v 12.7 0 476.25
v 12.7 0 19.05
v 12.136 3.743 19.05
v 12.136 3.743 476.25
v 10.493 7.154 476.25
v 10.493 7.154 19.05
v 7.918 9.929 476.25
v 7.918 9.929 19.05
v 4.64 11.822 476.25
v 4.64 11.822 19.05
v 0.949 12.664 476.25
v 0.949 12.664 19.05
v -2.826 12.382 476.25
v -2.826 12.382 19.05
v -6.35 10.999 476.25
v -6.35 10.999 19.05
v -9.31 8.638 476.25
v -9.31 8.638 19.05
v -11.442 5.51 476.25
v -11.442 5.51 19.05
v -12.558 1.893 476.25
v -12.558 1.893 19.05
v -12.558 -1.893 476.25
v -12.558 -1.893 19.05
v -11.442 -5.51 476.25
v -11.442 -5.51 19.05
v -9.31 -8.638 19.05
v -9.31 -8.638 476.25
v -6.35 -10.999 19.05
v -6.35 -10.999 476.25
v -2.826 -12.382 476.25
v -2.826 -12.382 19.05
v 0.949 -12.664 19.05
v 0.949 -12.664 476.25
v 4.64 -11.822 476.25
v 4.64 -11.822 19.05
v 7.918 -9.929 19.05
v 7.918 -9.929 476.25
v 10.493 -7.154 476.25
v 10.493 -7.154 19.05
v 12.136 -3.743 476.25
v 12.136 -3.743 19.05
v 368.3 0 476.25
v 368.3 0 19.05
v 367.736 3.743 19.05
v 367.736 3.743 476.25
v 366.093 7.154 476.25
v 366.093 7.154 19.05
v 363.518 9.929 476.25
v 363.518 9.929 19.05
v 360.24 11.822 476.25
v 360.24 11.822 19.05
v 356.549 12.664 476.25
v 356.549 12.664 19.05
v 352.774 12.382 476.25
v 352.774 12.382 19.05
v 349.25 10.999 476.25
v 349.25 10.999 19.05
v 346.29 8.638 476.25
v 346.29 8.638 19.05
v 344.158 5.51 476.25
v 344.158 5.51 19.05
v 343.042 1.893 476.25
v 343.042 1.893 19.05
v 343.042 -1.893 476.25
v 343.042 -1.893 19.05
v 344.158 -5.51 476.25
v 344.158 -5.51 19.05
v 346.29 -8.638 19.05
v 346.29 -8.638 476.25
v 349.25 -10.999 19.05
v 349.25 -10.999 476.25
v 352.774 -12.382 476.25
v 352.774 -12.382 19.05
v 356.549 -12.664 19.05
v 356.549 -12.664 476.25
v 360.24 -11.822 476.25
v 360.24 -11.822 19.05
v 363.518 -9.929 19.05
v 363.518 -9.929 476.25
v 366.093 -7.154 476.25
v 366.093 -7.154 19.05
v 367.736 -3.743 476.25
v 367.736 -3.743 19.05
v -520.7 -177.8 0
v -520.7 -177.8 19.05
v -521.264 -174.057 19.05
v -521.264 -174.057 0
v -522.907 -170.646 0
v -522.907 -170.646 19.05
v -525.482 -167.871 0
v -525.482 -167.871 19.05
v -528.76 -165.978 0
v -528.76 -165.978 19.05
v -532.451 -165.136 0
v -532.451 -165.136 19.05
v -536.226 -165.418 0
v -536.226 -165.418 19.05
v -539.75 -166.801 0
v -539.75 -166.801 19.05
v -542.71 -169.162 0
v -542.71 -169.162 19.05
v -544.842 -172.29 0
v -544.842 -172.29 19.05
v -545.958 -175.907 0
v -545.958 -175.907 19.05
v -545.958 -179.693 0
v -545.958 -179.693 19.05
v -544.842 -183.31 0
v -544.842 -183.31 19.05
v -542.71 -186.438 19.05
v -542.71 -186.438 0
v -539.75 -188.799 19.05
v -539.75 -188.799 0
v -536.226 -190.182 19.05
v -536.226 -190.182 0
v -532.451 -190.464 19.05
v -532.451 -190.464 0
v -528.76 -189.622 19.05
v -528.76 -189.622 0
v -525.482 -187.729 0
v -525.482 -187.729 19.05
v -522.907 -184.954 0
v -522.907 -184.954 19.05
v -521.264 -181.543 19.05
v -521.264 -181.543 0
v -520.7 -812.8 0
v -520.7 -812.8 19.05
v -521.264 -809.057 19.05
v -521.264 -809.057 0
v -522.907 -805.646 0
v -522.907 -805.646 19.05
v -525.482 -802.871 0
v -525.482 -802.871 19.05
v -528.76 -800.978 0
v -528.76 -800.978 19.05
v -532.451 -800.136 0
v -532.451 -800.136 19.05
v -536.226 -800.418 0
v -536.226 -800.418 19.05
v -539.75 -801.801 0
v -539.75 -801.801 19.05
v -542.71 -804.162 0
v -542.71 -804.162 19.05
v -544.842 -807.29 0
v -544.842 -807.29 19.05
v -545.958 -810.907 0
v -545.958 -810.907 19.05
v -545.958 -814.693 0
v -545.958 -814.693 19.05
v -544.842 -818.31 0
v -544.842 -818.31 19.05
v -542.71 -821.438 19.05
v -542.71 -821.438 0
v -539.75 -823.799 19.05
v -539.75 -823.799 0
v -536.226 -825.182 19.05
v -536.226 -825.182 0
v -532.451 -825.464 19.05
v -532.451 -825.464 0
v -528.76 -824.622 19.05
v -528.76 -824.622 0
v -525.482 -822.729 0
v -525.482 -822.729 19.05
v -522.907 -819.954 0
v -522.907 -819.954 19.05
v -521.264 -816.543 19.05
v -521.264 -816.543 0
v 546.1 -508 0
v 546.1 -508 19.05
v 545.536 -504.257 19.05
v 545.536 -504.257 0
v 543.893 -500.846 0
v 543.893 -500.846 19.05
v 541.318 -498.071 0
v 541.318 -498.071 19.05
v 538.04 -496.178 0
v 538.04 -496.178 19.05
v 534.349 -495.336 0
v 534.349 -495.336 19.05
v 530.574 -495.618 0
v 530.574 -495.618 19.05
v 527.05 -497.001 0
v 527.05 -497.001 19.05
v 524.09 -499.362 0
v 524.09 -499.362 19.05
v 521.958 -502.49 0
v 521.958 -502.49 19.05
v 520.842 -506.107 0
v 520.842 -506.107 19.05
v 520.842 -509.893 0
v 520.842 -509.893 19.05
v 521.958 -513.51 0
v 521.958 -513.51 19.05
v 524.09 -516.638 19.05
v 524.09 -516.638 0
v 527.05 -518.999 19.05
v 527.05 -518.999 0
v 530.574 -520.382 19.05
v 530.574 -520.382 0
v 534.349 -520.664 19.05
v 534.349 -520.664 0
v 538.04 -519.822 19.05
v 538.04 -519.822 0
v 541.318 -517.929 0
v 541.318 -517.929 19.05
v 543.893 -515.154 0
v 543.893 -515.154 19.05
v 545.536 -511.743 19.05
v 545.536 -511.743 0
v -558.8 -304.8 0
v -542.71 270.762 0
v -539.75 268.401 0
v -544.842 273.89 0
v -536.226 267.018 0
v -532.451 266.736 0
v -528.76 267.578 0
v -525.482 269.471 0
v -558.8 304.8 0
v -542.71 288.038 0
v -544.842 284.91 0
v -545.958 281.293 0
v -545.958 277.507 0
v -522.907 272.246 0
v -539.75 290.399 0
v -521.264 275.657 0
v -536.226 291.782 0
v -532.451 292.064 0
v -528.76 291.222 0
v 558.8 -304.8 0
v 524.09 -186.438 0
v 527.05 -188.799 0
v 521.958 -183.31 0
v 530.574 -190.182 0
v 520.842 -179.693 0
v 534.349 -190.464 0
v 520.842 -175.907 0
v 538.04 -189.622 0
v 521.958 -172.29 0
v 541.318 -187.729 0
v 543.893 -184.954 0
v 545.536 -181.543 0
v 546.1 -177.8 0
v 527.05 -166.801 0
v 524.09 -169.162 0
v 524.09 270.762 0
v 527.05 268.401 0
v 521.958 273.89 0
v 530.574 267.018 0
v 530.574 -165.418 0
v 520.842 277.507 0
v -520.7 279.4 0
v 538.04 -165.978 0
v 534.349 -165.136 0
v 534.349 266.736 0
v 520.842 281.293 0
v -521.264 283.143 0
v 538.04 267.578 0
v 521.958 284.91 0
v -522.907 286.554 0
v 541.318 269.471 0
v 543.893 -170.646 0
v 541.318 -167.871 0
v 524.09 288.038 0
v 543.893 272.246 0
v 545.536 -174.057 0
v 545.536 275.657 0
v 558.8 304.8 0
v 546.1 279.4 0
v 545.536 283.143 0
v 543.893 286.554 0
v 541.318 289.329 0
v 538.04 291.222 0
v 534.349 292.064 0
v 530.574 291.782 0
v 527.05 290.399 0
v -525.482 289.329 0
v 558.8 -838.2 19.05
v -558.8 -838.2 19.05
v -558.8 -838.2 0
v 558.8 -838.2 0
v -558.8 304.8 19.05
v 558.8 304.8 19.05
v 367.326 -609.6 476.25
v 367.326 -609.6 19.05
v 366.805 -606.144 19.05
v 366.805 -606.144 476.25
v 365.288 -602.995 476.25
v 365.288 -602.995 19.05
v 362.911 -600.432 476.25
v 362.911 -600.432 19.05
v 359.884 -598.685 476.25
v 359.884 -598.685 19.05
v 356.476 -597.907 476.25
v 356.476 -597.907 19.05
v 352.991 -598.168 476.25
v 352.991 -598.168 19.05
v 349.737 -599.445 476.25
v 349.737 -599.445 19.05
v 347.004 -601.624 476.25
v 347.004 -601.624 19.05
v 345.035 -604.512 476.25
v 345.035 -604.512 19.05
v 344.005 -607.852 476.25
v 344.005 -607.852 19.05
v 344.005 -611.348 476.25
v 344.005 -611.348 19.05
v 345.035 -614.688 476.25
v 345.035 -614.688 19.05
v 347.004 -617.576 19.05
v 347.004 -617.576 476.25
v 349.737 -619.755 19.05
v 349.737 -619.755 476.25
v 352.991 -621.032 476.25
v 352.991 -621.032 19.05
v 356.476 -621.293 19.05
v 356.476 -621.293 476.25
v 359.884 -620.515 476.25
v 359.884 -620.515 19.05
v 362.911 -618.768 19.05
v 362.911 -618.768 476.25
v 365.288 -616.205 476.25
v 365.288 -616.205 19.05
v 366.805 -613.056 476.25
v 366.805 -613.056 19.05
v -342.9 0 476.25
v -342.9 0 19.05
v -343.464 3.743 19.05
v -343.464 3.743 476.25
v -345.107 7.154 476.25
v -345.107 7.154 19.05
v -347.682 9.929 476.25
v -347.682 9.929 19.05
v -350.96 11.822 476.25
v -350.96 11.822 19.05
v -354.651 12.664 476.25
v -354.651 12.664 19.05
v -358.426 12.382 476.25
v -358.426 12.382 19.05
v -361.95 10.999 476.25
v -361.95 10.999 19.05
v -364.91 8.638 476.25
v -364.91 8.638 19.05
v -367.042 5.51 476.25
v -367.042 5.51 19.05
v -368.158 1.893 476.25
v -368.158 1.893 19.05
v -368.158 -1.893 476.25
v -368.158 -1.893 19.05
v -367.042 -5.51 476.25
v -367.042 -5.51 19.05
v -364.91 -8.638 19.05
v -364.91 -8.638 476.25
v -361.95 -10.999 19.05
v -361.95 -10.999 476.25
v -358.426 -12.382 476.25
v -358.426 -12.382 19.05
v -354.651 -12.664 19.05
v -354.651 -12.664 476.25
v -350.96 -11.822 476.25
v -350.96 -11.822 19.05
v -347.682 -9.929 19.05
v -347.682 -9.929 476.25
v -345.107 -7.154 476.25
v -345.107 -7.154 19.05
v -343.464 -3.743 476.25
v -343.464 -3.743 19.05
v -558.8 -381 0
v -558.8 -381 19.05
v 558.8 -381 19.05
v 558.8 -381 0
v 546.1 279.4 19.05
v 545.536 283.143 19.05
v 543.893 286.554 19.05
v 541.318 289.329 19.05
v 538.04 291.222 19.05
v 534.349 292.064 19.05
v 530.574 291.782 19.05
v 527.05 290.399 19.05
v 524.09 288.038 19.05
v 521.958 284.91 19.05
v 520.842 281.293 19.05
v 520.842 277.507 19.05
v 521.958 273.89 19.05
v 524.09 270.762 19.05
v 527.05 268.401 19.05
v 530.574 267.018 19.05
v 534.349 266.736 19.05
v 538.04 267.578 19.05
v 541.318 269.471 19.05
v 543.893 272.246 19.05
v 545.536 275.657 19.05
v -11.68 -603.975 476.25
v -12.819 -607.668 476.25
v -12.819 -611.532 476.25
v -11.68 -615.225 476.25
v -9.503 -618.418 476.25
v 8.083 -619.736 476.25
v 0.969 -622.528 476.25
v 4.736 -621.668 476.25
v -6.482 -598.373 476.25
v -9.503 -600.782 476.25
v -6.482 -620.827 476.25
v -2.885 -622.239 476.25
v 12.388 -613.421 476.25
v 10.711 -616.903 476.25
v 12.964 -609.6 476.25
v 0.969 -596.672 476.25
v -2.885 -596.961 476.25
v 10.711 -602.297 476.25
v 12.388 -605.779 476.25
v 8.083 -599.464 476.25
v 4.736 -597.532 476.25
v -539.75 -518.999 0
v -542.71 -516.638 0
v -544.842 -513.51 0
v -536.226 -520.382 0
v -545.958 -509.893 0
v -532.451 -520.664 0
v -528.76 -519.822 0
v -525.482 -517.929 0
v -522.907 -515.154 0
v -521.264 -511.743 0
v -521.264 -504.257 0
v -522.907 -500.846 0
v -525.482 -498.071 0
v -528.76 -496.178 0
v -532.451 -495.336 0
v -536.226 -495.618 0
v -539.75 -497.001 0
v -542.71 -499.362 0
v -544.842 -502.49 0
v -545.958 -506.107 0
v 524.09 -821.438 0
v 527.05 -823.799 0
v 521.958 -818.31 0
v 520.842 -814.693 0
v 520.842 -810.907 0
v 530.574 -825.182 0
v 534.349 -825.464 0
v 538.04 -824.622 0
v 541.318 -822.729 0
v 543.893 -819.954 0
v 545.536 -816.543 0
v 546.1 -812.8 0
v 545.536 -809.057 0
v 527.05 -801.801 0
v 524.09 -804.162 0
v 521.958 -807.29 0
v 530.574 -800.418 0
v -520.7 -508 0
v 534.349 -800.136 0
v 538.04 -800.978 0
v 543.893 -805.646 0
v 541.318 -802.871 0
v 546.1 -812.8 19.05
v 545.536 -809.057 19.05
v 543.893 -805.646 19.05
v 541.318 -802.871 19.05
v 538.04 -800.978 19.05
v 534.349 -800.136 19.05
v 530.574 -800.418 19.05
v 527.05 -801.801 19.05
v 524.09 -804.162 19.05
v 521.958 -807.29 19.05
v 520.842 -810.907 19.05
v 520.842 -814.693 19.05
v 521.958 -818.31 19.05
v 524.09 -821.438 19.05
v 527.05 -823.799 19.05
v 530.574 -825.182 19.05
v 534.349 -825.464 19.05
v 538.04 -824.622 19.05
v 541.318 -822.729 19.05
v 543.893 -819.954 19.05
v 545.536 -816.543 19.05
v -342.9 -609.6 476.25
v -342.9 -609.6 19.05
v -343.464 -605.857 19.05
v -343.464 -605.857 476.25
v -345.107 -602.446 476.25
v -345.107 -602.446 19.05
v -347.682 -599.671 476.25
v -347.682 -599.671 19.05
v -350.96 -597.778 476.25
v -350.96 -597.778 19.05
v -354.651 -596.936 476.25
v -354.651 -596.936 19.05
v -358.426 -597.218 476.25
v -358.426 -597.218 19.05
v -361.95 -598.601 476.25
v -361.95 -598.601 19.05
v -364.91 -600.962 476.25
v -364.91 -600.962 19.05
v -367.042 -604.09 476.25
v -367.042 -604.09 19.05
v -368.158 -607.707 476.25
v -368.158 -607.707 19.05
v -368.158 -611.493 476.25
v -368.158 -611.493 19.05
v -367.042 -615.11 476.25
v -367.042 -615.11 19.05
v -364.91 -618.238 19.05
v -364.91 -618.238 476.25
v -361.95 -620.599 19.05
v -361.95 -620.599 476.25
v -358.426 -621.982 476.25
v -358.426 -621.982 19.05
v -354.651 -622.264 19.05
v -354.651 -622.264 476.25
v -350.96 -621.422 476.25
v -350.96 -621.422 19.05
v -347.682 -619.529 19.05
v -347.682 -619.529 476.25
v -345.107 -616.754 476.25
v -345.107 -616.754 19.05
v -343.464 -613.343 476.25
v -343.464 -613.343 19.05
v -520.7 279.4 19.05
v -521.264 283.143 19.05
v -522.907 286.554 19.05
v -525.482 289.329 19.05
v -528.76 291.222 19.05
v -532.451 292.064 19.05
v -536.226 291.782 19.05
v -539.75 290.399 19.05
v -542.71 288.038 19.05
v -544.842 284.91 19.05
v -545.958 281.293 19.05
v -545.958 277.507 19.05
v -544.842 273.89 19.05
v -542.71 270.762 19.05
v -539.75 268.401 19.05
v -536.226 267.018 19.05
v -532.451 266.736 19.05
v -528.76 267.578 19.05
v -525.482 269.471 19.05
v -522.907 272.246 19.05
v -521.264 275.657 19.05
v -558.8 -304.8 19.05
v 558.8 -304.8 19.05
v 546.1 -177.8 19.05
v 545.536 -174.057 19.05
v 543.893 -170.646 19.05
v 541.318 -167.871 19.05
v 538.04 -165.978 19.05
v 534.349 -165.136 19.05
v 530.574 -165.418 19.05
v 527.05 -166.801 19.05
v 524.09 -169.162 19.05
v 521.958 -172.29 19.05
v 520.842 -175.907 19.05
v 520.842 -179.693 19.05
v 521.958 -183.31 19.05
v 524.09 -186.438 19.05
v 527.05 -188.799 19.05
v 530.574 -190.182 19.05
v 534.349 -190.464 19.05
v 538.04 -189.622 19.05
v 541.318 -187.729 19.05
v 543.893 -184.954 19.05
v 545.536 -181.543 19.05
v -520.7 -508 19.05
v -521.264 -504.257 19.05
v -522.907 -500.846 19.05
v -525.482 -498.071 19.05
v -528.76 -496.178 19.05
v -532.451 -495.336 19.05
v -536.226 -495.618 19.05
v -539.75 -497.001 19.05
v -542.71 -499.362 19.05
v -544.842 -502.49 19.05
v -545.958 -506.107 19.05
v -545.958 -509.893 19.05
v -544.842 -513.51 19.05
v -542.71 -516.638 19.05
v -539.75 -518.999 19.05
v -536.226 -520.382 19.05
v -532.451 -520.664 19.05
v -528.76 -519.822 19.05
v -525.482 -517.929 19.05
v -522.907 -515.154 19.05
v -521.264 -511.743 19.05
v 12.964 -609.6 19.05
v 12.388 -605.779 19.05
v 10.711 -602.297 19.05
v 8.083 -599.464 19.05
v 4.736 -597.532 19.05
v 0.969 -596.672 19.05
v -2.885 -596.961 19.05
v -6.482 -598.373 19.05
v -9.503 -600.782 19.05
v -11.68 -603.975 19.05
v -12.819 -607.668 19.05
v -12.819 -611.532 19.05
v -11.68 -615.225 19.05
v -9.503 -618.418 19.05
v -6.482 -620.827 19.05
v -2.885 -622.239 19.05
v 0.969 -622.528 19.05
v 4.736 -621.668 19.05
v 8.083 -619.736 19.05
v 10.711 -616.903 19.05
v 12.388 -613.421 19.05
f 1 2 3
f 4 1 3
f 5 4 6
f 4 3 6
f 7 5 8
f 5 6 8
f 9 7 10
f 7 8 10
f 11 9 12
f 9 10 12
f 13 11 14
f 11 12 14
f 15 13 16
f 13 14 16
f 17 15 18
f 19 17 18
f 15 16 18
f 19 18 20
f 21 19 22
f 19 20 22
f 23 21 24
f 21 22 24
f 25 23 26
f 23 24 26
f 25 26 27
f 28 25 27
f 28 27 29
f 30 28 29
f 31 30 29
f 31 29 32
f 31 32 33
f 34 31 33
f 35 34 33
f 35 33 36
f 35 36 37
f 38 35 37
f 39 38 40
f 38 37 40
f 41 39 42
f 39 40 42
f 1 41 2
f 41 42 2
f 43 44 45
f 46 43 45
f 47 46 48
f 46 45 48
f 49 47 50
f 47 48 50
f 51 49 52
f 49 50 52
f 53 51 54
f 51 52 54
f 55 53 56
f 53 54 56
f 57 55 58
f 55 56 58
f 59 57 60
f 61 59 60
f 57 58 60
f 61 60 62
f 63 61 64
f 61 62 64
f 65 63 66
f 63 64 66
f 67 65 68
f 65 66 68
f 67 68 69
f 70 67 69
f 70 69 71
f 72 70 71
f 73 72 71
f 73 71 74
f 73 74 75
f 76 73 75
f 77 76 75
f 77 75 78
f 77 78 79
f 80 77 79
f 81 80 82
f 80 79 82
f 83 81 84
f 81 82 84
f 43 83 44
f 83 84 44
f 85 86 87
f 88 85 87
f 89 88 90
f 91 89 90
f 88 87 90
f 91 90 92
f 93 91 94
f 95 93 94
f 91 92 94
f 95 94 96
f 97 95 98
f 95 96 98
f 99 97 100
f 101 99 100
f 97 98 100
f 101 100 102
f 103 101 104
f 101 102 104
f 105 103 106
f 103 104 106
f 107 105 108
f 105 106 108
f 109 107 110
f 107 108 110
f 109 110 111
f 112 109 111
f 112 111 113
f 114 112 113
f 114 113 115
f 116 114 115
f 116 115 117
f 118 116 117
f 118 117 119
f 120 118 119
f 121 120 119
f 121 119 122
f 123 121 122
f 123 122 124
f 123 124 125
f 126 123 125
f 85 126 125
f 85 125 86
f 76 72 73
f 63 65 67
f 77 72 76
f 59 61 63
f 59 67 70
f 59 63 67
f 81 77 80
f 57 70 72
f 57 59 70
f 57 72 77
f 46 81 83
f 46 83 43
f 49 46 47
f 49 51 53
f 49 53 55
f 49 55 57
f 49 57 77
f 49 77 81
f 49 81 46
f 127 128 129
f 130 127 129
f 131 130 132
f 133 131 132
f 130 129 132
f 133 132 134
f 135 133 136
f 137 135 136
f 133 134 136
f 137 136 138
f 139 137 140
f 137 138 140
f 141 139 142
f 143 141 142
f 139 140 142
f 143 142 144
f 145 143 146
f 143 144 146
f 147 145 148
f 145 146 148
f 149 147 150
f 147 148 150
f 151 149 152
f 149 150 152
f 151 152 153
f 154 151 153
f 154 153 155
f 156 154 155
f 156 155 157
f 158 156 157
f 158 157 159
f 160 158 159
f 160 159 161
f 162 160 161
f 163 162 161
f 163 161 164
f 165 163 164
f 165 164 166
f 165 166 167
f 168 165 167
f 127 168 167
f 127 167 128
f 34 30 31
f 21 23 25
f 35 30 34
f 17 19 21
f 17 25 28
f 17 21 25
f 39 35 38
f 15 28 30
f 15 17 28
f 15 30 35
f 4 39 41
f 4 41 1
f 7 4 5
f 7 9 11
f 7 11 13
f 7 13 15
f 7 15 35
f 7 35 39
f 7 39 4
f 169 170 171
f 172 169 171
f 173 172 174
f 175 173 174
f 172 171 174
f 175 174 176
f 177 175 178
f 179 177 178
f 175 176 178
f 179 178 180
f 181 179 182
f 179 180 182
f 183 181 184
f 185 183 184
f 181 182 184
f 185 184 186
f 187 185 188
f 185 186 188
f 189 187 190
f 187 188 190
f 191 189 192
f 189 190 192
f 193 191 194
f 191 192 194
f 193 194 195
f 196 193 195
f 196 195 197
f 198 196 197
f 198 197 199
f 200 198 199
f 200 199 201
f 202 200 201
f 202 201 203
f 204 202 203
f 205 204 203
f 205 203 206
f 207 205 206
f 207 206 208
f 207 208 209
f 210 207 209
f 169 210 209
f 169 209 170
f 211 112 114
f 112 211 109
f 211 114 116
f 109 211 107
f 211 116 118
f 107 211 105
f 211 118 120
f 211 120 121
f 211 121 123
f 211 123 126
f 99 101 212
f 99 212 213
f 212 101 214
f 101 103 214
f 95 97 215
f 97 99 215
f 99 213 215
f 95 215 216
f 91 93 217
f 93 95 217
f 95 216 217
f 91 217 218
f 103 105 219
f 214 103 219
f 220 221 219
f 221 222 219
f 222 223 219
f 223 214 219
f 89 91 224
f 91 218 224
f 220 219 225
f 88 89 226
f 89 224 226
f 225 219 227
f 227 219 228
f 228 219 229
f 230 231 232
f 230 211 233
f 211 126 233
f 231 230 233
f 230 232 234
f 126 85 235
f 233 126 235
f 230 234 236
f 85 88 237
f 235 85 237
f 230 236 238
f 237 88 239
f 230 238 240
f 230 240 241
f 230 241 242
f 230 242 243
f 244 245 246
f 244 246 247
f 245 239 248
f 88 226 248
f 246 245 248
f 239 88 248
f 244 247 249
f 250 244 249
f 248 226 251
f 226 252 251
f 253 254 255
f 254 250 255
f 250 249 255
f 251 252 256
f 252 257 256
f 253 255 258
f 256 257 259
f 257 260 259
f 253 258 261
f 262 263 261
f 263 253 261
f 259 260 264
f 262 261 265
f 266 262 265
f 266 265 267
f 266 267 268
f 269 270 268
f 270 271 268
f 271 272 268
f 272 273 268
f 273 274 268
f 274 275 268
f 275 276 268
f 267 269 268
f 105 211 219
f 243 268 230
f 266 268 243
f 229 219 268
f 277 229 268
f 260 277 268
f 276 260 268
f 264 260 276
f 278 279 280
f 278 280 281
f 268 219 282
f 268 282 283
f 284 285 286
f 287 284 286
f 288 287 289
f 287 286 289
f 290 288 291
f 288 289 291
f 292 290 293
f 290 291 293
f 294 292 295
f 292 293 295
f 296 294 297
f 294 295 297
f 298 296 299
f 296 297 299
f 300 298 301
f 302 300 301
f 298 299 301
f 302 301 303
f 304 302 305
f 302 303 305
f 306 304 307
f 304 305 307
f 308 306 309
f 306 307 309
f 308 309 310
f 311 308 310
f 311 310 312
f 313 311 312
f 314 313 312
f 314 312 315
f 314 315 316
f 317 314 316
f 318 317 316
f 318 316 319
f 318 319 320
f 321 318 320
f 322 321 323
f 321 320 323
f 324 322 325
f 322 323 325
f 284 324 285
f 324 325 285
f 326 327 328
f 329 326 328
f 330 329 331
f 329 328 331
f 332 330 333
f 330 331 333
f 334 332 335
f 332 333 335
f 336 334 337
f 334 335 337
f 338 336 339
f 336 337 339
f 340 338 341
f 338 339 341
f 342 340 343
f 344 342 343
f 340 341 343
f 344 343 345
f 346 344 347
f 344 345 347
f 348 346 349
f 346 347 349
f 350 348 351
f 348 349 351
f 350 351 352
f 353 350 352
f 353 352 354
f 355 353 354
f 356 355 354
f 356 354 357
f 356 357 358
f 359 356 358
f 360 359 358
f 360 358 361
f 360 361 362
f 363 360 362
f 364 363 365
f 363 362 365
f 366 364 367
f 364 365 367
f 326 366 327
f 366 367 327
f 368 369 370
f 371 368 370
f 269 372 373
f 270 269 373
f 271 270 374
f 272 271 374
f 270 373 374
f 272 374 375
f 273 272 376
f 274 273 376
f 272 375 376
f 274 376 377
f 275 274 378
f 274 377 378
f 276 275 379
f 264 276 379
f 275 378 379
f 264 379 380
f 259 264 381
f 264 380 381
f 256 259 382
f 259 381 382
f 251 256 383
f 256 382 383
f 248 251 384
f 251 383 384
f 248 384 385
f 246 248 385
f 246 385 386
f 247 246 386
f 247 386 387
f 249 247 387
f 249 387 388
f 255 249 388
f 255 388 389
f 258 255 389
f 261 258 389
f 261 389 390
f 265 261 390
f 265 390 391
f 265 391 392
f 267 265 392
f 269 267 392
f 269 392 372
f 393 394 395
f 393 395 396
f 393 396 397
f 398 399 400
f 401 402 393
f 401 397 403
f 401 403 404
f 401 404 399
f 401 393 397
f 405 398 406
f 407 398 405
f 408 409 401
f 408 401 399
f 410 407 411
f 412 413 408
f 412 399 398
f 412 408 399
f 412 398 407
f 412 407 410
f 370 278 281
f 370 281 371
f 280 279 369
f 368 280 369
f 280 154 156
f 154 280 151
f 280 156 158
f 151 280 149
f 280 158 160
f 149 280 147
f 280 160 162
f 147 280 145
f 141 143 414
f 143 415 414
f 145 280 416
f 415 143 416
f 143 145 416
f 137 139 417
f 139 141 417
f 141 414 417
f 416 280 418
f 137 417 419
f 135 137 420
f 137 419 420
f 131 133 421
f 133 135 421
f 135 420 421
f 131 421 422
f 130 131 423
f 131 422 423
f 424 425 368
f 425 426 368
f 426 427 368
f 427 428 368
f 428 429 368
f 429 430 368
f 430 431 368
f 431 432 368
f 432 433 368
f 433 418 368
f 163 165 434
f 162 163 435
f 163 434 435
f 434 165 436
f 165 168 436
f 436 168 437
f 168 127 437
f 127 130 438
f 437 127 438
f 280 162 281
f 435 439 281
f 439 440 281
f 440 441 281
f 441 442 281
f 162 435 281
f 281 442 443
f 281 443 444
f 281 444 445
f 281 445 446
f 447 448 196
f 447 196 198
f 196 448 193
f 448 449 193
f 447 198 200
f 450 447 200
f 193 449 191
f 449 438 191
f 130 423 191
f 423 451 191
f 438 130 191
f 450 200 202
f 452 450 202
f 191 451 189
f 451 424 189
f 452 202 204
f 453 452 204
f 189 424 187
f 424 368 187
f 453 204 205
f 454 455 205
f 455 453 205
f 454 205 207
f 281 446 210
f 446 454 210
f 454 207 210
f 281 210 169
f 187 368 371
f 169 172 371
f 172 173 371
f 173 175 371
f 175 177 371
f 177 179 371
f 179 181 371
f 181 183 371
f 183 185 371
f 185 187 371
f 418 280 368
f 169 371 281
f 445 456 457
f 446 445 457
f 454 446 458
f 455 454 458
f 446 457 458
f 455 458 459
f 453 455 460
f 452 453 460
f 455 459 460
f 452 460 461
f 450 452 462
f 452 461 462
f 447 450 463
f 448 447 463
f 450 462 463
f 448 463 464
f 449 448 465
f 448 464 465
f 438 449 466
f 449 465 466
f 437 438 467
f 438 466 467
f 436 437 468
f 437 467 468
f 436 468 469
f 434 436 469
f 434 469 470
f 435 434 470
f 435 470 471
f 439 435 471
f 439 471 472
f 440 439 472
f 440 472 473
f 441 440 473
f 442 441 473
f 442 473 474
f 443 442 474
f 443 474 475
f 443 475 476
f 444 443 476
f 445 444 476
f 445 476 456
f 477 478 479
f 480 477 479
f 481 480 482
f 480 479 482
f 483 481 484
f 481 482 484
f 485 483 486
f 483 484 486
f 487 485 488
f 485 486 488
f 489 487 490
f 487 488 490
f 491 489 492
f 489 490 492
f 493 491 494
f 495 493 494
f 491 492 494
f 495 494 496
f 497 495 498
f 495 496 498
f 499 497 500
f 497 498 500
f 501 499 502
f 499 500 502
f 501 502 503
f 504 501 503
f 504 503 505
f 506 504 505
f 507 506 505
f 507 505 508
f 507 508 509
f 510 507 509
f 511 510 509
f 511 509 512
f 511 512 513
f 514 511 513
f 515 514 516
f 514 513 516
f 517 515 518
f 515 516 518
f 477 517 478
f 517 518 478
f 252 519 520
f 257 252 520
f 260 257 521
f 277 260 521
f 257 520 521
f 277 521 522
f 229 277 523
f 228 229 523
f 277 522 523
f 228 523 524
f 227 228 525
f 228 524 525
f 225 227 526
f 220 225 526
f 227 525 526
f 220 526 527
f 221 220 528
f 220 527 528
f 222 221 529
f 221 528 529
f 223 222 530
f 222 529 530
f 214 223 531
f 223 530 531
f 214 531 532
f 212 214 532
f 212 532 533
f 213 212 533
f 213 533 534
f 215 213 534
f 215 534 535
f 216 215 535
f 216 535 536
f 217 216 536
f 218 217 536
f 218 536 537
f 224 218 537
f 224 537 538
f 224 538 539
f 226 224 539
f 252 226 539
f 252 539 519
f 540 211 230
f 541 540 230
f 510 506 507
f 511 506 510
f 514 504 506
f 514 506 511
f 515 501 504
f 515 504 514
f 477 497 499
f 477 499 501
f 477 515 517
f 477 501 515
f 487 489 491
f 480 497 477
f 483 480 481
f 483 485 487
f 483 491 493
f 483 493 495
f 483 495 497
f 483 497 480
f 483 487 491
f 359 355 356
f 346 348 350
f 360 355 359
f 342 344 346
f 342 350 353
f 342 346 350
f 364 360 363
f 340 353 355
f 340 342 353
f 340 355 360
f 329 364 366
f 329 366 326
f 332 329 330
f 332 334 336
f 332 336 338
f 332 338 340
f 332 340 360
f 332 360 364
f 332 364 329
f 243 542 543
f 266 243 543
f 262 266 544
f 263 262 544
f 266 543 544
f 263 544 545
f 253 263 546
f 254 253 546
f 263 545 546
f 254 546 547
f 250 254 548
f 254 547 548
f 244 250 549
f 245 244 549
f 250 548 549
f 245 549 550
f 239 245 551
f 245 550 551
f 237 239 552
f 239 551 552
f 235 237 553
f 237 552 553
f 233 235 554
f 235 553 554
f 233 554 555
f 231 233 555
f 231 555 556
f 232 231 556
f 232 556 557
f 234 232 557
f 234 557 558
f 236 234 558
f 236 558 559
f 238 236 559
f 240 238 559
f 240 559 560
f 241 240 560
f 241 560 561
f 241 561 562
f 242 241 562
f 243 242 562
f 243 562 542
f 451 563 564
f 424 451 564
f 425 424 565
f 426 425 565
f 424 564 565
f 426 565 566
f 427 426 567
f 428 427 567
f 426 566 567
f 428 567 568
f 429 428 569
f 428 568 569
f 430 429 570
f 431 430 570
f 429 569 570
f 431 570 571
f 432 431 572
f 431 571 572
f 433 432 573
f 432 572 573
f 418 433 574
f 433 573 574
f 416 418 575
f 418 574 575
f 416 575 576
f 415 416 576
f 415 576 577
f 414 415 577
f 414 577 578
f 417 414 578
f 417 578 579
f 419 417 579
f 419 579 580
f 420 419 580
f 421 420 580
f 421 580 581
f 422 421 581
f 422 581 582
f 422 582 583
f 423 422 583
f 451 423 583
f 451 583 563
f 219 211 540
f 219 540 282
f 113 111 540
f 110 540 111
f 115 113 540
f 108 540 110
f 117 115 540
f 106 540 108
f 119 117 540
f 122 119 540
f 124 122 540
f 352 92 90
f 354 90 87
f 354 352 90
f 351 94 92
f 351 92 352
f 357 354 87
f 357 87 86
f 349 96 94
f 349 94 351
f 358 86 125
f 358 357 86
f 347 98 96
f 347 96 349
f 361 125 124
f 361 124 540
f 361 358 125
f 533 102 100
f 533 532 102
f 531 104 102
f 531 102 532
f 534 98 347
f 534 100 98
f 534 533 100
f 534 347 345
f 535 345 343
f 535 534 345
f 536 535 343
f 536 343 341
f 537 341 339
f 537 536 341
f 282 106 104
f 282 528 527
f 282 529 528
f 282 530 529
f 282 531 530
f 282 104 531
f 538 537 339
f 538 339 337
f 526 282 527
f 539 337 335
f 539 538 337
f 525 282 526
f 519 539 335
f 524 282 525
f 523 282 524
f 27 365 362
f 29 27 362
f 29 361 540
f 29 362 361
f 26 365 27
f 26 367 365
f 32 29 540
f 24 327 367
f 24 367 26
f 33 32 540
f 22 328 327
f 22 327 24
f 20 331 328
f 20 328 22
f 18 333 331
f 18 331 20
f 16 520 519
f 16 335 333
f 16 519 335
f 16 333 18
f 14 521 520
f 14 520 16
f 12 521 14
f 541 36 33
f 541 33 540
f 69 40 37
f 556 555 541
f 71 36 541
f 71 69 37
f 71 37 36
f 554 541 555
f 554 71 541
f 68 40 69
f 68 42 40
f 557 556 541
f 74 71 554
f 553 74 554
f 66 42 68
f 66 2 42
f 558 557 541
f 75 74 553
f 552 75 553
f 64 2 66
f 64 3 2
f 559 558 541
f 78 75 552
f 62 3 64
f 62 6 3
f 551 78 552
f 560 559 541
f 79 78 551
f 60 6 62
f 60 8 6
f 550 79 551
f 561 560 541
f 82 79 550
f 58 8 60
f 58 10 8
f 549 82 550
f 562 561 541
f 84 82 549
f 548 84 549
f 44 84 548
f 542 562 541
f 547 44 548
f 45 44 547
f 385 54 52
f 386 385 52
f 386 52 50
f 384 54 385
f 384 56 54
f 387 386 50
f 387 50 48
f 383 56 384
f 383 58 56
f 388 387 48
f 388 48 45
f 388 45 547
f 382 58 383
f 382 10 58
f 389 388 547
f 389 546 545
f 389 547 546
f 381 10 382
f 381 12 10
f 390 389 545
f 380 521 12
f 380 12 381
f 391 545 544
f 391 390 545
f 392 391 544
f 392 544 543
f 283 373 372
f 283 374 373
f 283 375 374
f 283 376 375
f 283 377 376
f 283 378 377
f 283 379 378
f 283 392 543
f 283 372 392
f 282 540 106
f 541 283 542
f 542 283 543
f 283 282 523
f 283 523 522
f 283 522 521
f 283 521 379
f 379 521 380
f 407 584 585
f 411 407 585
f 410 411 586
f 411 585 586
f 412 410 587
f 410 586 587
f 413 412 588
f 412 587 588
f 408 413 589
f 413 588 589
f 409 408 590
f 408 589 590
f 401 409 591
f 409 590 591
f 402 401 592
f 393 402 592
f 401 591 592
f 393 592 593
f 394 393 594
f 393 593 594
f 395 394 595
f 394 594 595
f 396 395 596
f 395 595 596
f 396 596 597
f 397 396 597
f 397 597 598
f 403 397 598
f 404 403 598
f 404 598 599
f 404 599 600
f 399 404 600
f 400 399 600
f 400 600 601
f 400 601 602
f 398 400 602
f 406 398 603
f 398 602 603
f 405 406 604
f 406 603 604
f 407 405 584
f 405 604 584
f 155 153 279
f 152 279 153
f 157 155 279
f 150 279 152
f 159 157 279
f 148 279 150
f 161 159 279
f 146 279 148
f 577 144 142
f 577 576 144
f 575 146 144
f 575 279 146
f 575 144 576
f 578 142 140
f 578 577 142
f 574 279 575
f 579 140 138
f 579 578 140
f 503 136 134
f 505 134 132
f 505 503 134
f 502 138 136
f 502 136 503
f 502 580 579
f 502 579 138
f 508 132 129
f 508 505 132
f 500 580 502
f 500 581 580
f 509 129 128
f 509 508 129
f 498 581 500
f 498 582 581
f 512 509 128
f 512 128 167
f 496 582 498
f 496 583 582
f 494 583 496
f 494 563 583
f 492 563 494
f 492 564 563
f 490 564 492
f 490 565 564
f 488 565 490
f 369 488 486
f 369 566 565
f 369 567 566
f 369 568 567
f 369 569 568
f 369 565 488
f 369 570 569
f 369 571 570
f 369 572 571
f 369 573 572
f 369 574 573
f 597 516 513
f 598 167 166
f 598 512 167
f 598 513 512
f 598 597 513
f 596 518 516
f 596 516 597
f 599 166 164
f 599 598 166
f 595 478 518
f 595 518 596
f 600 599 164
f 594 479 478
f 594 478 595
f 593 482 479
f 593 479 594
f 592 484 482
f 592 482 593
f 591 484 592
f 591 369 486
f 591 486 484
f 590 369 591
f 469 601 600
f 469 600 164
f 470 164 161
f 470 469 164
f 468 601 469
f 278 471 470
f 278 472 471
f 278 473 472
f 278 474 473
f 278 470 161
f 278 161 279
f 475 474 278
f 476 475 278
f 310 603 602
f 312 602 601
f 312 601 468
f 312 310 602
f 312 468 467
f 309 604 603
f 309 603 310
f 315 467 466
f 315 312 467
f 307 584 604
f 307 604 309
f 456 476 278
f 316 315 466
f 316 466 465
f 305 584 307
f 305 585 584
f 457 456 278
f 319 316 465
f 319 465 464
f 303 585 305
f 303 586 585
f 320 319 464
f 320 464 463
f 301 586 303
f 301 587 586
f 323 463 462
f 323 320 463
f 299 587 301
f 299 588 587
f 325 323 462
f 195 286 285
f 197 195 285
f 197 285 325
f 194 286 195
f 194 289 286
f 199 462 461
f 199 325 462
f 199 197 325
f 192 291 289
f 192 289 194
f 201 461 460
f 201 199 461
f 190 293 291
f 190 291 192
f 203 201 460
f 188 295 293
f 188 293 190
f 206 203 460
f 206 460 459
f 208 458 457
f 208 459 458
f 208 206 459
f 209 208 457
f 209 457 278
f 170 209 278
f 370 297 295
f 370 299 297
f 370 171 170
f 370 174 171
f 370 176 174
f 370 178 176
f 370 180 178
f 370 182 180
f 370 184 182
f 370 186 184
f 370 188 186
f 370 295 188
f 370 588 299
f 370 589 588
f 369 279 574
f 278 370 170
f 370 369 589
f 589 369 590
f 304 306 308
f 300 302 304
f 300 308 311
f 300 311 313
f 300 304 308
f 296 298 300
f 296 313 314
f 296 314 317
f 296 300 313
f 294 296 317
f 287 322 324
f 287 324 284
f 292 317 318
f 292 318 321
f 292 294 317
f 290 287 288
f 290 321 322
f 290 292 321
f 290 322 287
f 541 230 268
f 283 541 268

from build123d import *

# Parameters (mm, degrees)
F0_W      = 1117.6
F0_H      = 609.6
F1_DEPTH  = 19.05
F2_W      = 1117.6
F2_H      = 457.2
F3_DEPTH  = 19.05
F4_R      = 12.7
F6_DEPTH  = 25.4
F5_R      = 12.7
F7_DEPTH  = 25.4
F8_R      = 12.7
F9_DEPTH  = 457.2
F10_R     = 12.7
F10_R_2   = 11.725759
F10_R_3   = 12.964019
F11_DEPTH = 457.2


with BuildPart() as f1:
    # F0 (on Top) → F1 (new body)
    with BuildSketch(Plane.XY):
        Rectangle(F0_W, F0_H)
    extrude(amount=F1_DEPTH)

    # F4 (on face) → F6 (cut)
    with BuildSketch(Plane.XY.offset(19.05)):
        with Locations((533.4, 279.4)):
            Circle(F4_R)
        with Locations((533.4, -177.8)):
            Circle(F4_R)
        with Locations((-533.4, -177.8)):
            Circle(F4_R)
        with Locations((-533.4, 279.4)):
            Circle(F4_R)
    extrude(amount=-F6_DEPTH, mode=Mode.SUBTRACT)

    # F8 (on face) → F9 (join)
    with BuildSketch(Plane.XY.offset(19.05)):
        with Locations((-355.6, 0)):
            Circle(F8_R)
        Circle(F8_R)
        with Locations((355.6, 0)):
            Circle(F8_R)
    extrude(amount=F9_DEPTH)


with BuildPart() as f3:
    # F2 (on face) → F3 (new body)
    with BuildSketch(Plane.XY.offset(19.05)):
        with Locations((0, -609.6)):
            Rectangle(F2_W, F2_H)
    extrude(amount=-F3_DEPTH)

    # F5 (on face) → F7 (cut)
    with BuildSketch(Plane.XY.offset(19.05)):
        with Locations((-533.4, -508)):
            Circle(F5_R)
        with Locations((-533.4, -812.8)):
            Circle(F5_R)
        with Locations((533.4, -812.8)):
            Circle(F5_R)
        with Locations((533.4, -508)):
            Circle(F5_R)
    extrude(amount=-F7_DEPTH, mode=Mode.SUBTRACT)

    # F10 (on face) → F11 (join)
    with BuildSketch(Plane.XY.offset(19.05)):
        with Locations((-355.6, -609.6)):
            Circle(F10_R)
        with Locations((355.6, -609.6)):
            Circle(F10_R_2)
        with Locations((0, -609.6)):
            Circle(F10_R_3)
    extrude(amount=F11_DEPTH)


solid = Compound([f1.part, f3.part])
